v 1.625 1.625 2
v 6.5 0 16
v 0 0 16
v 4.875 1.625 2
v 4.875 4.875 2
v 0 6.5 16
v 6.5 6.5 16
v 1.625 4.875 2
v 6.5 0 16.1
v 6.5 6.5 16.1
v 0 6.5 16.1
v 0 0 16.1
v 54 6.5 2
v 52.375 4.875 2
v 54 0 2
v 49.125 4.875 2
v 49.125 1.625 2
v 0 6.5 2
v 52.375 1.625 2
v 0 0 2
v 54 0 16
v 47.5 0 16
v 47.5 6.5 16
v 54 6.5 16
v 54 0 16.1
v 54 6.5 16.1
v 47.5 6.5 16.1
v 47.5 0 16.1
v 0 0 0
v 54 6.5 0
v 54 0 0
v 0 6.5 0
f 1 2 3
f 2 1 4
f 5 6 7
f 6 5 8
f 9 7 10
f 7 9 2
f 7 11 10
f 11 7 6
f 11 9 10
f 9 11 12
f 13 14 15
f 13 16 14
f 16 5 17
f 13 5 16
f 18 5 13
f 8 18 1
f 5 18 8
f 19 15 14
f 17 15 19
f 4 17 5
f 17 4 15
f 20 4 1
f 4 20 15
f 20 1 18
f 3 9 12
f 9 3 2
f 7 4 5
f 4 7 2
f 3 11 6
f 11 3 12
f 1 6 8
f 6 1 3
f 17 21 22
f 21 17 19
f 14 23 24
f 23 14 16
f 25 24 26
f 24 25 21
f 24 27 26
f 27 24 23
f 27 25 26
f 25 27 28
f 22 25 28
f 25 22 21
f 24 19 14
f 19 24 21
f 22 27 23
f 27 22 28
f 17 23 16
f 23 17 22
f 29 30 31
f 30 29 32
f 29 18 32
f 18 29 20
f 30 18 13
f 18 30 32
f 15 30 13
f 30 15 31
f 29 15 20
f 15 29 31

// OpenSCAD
$outer_width = 54;
$inner_width = 41;
$holderwidth = ($outer_width - $inner_width) / 2;
$schwertdicke = 14; //schwertdicke ist dicke an der Stelle bis zur Wand (dickste Stelle des Schwertes)
$thickness = 2;
module connector() {
hull() {
    
    translate([$holderwidth / 4,$holderwidth / 4,$thickness])
linear_extrude(height = 0.1)
square([$holderwidth/2, $holderwidth/2]);

translate([0,0,$schwertdicke+$thickness])
linear_extrude(height = 0.1)
square([$holderwidth, $holderwidth]);
}
}

connector();
translate([$inner_width+$holderwidth,0,0])
connector();

linear_extrude(height = $thickness)
square([$outer_width, $holderwidth]);
